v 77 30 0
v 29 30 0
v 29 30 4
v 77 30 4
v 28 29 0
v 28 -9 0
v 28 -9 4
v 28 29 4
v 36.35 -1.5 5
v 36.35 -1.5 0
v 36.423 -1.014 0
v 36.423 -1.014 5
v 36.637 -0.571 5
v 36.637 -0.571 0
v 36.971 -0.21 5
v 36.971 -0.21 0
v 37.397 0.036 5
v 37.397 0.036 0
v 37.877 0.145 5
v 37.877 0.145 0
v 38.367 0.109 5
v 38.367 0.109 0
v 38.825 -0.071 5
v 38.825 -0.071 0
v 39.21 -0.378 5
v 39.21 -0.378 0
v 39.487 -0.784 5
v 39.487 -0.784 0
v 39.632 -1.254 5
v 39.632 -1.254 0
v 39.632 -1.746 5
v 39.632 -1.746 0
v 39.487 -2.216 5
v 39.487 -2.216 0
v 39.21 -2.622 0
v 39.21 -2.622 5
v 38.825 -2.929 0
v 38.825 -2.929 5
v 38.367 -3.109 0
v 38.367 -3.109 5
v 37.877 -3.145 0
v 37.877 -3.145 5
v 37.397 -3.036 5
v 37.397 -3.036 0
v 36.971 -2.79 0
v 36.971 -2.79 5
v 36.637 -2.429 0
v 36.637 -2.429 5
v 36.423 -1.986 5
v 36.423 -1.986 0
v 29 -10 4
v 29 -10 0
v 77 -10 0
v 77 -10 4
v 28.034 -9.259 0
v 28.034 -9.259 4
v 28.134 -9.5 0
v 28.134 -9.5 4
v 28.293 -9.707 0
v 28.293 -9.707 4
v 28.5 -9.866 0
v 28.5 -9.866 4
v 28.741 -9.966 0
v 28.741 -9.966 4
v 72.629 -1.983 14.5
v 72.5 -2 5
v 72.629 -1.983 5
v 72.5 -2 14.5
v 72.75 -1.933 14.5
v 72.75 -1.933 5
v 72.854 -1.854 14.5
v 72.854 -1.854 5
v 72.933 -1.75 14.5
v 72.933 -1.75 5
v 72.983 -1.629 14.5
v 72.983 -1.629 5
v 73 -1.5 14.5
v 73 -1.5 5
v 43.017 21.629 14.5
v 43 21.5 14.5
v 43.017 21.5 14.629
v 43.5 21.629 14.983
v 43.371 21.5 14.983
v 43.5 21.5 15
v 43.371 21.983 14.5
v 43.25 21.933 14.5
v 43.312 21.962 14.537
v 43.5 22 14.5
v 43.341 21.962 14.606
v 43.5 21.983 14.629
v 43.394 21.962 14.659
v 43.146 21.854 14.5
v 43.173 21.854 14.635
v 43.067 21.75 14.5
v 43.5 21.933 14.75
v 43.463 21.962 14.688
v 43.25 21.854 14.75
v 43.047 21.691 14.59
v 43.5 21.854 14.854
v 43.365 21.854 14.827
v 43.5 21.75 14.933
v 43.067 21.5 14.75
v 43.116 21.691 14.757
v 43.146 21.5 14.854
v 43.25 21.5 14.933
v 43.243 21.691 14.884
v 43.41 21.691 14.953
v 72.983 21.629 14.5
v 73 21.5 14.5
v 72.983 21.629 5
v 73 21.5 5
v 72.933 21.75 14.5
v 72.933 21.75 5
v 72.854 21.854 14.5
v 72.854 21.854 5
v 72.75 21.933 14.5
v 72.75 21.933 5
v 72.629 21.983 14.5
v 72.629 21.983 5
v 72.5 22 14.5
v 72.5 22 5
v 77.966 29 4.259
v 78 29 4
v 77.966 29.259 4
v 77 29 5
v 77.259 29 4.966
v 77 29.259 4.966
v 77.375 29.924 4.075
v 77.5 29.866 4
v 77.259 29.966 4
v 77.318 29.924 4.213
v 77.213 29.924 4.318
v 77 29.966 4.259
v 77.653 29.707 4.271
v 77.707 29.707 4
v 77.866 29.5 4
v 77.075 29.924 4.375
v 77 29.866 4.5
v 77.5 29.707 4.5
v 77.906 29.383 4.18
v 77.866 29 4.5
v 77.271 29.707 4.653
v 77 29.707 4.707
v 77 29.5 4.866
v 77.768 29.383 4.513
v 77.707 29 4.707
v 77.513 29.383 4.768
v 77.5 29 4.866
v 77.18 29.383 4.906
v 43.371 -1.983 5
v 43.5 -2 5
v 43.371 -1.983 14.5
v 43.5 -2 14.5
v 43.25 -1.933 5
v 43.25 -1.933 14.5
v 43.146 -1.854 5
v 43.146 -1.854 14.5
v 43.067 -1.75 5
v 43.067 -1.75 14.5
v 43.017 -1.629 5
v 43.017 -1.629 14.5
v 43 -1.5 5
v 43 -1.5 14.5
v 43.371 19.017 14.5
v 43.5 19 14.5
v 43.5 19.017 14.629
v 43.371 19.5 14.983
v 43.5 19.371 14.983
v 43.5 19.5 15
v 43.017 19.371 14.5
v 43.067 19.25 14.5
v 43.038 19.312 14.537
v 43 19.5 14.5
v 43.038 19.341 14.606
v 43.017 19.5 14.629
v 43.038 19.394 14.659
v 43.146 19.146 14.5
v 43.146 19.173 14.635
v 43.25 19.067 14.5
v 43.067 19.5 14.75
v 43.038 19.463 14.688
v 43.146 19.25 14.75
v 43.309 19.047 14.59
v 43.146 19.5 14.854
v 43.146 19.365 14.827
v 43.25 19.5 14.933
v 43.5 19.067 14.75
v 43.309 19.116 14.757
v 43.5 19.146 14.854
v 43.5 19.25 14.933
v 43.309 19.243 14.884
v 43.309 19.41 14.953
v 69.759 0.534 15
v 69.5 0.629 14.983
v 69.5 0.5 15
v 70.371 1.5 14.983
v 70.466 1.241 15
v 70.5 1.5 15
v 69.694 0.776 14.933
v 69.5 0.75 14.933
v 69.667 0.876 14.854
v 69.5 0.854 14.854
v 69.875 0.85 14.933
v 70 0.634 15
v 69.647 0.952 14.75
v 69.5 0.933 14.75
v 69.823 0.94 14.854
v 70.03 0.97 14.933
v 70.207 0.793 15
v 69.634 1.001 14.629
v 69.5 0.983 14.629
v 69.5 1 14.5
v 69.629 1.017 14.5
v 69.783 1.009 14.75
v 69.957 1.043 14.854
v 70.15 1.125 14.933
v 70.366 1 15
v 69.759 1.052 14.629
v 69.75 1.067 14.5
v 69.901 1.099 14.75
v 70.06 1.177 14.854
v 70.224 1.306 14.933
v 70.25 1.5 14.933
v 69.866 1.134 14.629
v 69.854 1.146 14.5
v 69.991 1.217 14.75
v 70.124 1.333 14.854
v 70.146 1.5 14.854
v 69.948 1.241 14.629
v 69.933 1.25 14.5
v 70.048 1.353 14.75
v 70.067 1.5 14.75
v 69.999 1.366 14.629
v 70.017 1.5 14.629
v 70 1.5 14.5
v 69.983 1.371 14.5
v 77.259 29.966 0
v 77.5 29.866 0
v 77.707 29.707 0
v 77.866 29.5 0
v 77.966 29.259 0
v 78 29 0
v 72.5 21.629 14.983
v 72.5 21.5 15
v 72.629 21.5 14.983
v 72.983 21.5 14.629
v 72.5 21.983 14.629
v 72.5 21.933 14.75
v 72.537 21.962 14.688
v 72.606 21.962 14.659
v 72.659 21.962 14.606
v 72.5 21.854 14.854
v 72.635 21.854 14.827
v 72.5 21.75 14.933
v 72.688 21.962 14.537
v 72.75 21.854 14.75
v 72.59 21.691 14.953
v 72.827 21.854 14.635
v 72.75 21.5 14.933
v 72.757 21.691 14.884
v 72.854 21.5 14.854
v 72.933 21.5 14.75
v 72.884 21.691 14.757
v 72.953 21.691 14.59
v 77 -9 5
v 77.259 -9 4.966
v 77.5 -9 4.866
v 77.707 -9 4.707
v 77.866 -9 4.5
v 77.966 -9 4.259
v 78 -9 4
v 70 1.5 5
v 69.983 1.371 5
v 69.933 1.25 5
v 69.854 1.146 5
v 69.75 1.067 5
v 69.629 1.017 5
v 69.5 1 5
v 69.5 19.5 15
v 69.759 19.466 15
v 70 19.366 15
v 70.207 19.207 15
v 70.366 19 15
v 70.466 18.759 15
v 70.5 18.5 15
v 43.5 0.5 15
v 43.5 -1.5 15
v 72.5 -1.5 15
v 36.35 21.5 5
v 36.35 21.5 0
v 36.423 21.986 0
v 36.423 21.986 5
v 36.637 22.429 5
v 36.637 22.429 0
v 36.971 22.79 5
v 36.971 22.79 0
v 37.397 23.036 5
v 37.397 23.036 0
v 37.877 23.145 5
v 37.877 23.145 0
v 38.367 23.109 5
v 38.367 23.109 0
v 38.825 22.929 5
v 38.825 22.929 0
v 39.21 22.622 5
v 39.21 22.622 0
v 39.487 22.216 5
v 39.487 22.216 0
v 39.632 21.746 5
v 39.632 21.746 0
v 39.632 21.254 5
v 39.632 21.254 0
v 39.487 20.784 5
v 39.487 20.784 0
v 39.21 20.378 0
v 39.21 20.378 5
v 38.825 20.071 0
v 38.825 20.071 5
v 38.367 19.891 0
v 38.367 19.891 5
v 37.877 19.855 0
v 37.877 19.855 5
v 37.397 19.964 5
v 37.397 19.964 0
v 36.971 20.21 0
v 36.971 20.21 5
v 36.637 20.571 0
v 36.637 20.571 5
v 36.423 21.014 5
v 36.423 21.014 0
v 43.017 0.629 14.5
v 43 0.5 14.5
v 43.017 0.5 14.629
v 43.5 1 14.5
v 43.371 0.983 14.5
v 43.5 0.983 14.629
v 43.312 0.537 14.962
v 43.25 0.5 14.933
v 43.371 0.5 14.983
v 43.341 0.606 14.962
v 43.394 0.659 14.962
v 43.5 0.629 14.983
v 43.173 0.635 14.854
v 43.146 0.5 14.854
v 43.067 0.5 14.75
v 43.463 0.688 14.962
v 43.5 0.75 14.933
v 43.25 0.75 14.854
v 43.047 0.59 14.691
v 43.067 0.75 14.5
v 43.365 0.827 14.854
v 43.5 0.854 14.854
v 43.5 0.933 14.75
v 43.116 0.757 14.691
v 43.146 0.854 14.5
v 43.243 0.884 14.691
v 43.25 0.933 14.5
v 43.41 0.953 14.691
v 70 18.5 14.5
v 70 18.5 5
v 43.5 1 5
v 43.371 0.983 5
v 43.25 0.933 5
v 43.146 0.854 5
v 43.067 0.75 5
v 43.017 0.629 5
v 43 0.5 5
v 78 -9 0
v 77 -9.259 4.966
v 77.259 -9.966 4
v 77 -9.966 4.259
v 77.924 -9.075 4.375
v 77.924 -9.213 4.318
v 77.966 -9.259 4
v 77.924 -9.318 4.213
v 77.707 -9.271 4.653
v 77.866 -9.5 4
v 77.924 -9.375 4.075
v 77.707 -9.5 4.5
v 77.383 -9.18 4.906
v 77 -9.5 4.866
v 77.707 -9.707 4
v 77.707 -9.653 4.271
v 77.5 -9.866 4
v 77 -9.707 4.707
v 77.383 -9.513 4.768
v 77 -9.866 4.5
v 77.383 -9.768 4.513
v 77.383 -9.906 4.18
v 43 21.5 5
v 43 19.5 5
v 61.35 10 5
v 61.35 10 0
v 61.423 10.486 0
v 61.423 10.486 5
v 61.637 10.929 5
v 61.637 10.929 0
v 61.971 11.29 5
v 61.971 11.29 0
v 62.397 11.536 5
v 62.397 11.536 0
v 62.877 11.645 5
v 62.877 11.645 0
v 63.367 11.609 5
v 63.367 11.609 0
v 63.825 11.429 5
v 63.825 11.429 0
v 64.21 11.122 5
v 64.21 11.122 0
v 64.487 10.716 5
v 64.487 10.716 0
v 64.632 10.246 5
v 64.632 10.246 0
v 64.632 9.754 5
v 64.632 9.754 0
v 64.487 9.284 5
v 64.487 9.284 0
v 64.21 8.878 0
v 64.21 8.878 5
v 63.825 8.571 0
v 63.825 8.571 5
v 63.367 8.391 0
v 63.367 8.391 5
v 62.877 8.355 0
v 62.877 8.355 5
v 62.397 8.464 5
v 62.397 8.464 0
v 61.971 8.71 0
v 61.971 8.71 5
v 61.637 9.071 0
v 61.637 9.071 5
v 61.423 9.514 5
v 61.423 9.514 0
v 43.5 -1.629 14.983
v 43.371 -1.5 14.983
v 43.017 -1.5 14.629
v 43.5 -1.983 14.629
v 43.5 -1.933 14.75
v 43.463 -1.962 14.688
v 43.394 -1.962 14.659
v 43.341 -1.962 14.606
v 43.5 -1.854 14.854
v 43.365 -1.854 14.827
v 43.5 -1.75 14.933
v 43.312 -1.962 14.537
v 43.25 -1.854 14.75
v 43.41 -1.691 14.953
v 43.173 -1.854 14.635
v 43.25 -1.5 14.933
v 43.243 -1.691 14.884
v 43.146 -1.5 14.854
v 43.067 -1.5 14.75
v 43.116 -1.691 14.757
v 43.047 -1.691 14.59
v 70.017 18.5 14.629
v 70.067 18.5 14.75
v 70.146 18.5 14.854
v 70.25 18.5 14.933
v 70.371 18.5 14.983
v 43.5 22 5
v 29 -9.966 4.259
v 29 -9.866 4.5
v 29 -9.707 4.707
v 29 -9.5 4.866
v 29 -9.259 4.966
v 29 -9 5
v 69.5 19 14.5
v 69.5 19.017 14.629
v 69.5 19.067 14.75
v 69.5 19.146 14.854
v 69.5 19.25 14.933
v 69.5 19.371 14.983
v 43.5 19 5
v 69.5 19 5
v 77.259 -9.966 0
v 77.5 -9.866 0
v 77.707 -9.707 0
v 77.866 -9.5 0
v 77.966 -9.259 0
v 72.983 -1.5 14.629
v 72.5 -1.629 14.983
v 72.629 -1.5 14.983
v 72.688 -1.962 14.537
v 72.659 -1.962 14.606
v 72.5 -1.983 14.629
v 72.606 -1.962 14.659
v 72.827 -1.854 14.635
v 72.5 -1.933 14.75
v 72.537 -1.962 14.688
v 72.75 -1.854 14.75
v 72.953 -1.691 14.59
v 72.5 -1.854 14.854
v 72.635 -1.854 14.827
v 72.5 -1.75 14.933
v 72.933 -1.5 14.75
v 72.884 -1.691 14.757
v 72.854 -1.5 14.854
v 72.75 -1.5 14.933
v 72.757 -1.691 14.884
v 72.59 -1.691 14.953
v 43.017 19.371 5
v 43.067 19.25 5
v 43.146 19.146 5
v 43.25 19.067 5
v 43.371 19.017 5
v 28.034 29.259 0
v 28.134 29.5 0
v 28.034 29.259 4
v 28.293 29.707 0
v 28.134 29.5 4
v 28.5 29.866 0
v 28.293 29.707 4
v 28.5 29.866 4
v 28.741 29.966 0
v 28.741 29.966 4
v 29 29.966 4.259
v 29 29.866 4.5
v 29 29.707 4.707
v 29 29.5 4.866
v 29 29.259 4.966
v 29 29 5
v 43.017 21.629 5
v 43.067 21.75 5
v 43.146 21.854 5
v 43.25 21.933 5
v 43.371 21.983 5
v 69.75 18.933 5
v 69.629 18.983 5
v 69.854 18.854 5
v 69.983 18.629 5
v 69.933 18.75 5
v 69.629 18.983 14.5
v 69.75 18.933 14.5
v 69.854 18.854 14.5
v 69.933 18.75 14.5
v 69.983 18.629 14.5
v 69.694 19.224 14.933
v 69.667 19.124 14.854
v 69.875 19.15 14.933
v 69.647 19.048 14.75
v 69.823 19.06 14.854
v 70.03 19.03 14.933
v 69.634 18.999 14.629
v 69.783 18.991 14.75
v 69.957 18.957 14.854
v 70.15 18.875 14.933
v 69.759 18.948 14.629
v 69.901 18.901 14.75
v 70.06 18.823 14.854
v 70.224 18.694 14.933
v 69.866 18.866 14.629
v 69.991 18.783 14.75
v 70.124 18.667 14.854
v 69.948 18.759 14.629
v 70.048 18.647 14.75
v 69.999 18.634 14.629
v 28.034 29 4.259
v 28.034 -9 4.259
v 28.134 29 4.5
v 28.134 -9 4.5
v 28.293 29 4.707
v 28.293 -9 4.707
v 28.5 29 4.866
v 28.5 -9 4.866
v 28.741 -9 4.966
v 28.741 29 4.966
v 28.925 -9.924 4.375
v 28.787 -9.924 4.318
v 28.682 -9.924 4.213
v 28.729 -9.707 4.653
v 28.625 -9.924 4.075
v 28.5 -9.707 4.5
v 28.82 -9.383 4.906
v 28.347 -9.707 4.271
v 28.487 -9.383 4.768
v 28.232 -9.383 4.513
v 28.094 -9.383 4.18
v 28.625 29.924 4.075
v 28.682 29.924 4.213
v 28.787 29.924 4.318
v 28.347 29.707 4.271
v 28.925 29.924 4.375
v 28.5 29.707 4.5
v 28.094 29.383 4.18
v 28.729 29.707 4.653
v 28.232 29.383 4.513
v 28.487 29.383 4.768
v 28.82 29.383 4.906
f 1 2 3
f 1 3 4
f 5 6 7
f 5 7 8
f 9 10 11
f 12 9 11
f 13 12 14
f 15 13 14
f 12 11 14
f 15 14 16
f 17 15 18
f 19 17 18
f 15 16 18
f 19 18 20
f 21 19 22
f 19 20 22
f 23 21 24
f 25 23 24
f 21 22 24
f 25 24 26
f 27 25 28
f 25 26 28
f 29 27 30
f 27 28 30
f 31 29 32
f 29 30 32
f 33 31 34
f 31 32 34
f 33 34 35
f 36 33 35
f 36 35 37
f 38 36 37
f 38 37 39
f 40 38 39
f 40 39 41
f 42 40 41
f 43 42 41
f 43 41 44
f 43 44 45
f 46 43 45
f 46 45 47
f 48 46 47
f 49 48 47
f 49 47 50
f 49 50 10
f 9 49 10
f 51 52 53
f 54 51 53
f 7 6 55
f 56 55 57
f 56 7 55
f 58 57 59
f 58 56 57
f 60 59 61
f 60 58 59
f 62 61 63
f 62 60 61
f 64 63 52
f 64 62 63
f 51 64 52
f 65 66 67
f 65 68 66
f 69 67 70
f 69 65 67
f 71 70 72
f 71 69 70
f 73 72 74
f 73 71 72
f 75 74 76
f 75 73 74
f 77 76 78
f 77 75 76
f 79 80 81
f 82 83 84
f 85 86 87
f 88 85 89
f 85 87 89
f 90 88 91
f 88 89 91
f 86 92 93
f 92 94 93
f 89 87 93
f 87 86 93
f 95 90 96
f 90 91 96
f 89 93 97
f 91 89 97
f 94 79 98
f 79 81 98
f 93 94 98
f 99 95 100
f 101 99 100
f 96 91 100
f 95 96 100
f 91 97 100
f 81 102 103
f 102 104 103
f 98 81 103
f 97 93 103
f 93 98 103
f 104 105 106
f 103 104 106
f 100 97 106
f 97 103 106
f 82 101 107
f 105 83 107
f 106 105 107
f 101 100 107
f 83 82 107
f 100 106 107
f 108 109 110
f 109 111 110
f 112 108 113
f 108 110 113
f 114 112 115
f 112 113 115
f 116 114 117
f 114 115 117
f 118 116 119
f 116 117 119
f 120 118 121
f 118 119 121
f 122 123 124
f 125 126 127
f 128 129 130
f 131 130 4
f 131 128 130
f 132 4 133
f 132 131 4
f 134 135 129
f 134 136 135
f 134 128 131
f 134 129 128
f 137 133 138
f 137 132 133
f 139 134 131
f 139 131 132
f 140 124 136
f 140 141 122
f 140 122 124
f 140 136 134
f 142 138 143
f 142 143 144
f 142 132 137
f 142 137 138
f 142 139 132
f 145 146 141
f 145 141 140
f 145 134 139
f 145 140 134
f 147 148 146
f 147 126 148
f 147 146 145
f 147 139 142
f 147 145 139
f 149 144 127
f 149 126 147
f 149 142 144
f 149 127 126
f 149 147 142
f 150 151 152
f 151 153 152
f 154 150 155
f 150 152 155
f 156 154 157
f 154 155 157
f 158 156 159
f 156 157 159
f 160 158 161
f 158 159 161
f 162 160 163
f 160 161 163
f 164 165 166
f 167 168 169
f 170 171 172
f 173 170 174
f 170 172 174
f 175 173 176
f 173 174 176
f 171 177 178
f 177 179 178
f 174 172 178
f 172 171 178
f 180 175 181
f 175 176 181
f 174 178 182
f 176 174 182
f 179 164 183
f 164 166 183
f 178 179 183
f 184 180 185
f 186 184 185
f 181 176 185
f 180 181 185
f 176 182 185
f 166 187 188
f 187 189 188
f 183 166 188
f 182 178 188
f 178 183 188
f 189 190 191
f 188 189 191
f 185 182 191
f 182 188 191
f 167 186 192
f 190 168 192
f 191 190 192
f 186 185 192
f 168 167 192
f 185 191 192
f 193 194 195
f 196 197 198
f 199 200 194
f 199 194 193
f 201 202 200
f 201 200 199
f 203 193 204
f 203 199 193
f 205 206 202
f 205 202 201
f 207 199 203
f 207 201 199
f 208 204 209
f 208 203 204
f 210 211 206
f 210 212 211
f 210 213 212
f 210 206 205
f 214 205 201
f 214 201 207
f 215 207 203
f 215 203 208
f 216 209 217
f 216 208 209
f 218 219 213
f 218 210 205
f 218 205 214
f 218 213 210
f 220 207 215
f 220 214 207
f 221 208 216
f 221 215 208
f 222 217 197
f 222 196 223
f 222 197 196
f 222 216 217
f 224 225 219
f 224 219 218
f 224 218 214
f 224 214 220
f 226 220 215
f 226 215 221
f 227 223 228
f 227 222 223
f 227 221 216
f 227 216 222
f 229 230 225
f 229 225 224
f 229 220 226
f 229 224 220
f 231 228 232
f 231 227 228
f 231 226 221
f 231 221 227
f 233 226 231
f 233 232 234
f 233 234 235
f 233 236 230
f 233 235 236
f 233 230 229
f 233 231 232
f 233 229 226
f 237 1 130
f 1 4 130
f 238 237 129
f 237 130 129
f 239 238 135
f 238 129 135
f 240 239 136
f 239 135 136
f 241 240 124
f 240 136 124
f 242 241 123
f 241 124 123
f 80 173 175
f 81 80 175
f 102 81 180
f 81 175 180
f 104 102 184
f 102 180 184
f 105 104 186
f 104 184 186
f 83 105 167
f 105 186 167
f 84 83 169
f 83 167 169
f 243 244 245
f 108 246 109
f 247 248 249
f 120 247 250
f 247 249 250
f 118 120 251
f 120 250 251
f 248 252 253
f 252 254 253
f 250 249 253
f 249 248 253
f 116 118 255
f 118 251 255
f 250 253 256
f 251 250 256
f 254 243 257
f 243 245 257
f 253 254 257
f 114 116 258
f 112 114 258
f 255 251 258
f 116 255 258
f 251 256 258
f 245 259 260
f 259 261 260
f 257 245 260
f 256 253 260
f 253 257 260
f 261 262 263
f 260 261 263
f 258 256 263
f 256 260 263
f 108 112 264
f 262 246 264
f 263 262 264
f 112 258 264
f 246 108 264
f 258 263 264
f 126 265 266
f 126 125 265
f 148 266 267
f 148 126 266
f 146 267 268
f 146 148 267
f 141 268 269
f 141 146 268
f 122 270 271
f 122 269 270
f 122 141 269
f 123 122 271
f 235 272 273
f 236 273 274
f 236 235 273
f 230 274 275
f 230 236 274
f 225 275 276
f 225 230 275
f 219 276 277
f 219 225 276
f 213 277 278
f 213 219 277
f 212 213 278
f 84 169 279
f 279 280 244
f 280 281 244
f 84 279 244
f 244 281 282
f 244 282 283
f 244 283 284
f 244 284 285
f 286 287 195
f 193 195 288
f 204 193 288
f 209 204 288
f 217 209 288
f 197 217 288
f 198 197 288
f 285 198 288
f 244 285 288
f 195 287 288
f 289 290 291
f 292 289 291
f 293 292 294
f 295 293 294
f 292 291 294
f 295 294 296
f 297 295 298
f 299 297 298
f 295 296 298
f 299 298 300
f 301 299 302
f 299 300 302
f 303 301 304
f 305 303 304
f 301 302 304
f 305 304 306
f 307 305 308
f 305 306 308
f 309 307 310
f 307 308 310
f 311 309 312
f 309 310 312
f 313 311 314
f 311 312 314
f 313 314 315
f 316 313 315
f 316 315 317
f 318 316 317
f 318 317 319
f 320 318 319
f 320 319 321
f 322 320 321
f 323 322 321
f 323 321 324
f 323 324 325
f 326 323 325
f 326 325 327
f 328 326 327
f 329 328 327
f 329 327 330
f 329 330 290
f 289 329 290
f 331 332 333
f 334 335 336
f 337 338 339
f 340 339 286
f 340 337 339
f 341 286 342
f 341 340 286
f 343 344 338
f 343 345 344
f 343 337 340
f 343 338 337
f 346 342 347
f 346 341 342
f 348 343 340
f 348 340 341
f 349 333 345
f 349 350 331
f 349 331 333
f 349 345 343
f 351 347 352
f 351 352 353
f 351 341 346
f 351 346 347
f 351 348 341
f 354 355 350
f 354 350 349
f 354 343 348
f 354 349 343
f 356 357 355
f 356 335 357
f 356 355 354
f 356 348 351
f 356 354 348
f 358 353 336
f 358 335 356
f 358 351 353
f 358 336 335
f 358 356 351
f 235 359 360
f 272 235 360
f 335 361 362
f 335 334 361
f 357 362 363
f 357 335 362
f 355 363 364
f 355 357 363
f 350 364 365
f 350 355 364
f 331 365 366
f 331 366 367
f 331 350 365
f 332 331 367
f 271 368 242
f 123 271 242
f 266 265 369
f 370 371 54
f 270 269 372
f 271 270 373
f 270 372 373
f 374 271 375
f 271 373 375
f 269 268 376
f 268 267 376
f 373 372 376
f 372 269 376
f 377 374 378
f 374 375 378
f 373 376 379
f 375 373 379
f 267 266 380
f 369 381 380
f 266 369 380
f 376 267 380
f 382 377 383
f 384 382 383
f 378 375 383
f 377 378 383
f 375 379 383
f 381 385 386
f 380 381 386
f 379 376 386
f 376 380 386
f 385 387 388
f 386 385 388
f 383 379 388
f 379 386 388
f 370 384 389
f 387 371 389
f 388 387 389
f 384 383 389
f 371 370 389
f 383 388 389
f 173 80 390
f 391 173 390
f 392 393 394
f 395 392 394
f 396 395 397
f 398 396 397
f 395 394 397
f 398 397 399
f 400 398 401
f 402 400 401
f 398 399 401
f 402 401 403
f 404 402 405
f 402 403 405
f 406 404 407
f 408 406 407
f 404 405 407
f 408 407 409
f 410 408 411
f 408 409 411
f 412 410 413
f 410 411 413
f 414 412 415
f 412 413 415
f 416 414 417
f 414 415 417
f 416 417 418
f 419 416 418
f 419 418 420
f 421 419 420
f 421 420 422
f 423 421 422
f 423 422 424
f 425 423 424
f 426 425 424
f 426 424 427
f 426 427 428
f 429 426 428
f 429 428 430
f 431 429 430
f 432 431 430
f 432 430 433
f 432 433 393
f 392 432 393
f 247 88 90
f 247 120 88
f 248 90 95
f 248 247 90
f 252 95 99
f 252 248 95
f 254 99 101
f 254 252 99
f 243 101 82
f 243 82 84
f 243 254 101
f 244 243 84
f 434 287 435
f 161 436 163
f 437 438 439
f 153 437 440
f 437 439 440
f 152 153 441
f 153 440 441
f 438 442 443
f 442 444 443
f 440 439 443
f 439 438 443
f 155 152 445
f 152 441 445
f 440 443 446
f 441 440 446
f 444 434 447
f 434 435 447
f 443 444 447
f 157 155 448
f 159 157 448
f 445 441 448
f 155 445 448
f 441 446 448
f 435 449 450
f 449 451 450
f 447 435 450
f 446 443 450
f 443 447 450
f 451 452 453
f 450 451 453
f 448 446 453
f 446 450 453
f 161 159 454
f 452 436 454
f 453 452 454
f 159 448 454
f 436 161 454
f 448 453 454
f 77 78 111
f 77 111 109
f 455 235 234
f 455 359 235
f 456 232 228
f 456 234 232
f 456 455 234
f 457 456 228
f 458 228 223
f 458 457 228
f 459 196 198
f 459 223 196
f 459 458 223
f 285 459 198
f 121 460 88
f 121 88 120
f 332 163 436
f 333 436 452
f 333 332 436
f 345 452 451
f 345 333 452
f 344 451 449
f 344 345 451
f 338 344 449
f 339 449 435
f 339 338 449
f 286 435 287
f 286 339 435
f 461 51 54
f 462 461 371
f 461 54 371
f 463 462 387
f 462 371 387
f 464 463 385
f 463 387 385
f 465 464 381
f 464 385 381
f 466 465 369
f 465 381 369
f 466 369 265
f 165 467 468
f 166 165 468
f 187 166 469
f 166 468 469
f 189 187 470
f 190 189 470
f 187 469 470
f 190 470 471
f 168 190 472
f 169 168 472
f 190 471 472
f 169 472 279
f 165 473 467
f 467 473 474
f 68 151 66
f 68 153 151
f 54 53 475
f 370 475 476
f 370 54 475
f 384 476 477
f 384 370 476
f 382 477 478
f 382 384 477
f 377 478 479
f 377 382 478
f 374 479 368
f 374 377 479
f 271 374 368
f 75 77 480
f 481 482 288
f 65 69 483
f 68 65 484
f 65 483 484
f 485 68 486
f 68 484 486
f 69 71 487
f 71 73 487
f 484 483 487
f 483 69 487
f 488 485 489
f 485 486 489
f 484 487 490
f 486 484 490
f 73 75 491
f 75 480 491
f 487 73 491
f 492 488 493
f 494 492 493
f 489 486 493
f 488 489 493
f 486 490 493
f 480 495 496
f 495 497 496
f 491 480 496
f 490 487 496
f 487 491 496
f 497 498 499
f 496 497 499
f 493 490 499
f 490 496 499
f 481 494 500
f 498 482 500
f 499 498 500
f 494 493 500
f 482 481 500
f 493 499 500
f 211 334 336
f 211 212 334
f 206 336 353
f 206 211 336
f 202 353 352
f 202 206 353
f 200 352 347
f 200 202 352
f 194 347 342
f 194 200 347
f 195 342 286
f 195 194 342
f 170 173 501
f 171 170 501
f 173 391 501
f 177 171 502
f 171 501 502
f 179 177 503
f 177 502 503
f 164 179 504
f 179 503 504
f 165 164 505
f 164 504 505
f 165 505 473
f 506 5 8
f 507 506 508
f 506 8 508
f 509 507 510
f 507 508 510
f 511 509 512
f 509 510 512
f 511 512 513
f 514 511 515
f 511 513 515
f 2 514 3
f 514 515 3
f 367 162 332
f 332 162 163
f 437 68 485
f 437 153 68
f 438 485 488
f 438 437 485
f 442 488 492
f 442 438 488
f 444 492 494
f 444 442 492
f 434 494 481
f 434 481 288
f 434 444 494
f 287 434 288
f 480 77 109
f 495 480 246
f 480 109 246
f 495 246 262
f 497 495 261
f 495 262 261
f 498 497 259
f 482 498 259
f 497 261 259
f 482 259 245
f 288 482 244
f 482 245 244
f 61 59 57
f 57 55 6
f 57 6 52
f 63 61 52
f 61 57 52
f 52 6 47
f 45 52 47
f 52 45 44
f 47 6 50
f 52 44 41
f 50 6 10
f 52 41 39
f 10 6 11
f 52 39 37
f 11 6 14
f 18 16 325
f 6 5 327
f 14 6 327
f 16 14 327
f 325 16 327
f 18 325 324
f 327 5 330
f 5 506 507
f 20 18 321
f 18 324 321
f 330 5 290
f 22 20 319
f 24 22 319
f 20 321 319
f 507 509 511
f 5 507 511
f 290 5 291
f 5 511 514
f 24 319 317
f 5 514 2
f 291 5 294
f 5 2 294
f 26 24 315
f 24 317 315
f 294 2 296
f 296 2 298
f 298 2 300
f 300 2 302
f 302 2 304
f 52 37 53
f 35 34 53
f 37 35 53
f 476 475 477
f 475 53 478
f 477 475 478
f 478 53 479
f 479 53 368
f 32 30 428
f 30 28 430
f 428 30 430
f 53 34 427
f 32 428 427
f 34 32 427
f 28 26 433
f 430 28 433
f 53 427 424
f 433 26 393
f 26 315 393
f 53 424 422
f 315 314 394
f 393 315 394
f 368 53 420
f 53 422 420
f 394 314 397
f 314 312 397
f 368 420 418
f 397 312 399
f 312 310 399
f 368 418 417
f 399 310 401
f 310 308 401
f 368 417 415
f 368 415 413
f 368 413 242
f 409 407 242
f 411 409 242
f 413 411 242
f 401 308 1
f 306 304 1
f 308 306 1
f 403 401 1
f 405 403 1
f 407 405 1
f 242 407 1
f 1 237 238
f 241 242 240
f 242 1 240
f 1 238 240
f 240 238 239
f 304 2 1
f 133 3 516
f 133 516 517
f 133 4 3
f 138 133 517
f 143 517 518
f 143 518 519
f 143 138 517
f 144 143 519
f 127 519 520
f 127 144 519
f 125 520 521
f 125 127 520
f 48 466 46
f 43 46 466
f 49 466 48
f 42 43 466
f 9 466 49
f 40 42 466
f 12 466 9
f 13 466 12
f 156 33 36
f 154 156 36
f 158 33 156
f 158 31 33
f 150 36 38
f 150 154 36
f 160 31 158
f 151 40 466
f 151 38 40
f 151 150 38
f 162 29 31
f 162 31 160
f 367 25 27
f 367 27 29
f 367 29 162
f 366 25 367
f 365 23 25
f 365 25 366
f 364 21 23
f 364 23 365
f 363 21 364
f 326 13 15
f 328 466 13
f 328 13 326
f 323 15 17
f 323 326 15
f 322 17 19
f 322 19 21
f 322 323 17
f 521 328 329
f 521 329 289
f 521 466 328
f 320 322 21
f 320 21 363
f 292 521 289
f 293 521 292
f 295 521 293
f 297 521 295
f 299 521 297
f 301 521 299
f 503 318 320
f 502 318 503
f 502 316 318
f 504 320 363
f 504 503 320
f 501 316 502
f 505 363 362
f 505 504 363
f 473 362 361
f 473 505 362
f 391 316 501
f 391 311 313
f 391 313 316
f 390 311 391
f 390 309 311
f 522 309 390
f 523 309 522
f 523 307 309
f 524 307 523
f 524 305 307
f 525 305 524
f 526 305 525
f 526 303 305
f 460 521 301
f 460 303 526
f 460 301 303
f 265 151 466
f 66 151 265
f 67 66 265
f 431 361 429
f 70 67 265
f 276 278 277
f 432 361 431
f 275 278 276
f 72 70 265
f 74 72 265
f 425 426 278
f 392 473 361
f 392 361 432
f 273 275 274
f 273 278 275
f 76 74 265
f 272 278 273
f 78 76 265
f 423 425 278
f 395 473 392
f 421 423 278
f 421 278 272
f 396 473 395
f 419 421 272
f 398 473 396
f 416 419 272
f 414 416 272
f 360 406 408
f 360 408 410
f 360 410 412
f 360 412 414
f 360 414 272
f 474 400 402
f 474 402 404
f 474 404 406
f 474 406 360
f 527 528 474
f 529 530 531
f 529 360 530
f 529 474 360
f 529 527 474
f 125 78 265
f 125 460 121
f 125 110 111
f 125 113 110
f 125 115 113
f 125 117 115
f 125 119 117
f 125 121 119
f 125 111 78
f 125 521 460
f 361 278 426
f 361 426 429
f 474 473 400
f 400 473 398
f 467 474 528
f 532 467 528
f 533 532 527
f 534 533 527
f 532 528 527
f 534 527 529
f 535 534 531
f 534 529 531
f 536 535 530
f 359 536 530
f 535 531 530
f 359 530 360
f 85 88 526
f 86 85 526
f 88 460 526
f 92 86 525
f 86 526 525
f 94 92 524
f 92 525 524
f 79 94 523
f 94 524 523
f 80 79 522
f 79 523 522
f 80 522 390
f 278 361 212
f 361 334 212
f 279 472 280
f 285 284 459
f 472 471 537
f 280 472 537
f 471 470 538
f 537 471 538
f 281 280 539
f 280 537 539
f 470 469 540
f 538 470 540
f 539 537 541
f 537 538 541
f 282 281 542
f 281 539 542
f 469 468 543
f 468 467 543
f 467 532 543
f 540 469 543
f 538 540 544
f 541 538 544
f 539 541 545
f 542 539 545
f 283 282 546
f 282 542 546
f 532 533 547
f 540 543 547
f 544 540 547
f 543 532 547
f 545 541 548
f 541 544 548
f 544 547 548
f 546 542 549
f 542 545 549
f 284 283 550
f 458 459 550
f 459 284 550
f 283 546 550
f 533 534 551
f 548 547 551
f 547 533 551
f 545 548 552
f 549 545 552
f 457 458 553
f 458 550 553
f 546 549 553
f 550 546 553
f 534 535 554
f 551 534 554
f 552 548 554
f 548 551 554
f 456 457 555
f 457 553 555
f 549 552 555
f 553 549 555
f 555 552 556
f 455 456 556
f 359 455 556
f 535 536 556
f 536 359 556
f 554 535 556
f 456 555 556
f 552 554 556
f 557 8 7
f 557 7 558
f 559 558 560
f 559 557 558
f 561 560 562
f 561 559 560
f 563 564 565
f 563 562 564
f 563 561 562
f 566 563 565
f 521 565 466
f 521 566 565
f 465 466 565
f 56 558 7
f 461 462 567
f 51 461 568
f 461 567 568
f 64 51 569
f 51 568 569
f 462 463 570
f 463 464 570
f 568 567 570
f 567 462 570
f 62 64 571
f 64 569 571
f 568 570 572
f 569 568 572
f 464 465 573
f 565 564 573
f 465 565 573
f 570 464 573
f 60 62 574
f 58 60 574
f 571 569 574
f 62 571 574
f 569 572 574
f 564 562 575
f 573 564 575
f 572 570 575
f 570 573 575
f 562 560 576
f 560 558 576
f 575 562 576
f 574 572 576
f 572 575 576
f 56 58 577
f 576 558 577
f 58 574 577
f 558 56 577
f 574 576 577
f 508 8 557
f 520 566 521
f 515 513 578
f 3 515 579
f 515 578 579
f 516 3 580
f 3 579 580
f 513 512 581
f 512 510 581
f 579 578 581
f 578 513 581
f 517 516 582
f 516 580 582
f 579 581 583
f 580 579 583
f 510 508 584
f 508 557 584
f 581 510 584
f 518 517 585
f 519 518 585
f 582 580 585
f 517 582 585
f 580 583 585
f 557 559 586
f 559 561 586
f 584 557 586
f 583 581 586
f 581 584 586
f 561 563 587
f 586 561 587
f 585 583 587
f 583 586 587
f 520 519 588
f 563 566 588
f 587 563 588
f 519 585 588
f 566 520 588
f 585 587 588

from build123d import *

# Parameters (mm, degrees)
SKETCH_2_W          = 50
SKETCH_2_H          = 40
EXTRUDE_1_DEPTH     = 5
EXTRUDE_START       = -8
SKETCH_5_W          = 30
SKETCH_5_H          = 10
EXTRUDE_2_DEPTH     = 3
SKETCH_6_W          = 30
SKETCH_6_H          = 10
EXTRUDE_3_DEPTH     = 3
CUT_EXTRUDE_1_REACH = 86.906
SKETCH_7_R          = 1.65
FILLET_3_R          = 1
SKETCH_8_W          = 10
SKETCH_8_H          = 21
EXTRUDE_4_DEPTH     = 3
FILLET_4_R          = 0.5


with BuildPart() as part:
    # 草图2 → 凸台-拉伸1 (new body)
    with BuildSketch(Plane.XY):
        with Locations((53, 10)):
            Rectangle(SKETCH_2_W, SKETCH_2_H)
    extrude(amount=EXTRUDE_1_DEPTH)

    # 草图5 → 凸台-拉伸2 (add)
    with BuildSketch(Plane.XZ.offset(10).offset(EXTRUDE_START)):
        with Locations((58, 10)):
            Rectangle(SKETCH_5_W, SKETCH_5_H)
    extrude(amount=-EXTRUDE_2_DEPTH)

    # 草图6 → 凸台-拉伸3 (add)
    with BuildSketch(Plane(origin=(0, 30, 0), x_dir=(1, 0, 0), z_dir=(0, 1, 0)).offset(EXTRUDE_START)):
        with Locations((58, -10)):
            Rectangle(SKETCH_6_W, SKETCH_6_H)
    extrude(amount=-EXTRUDE_3_DEPTH)

    # 草图7 → 切除-拉伸1 (cut, up to next)
    with BuildSketch(Plane(origin=(0, 0, 0), x_dir=(-1, 0, 0), z_dir=(0, 0, -1)), mode=Mode.PRIVATE) as cut_extrude_1_sk1:
        with Locations((-63, 10)):
            Circle(SKETCH_7_R)
    cut_extrude_1_tool1 = extrude(cut_extrude_1_sk1.sketch, amount=-CUT_EXTRUDE_1_REACH, mode=Mode.PRIVATE) & part.part
    # 草图7 → 切除-拉伸1 (cut, up to next)
    with BuildSketch(Plane(origin=(0, 0, 0), x_dir=(-1, 0, 0), z_dir=(0, 0, -1)), mode=Mode.PRIVATE) as cut_extrude_1_sk2:
        with Locations((-38, -1.5)):
            Circle(SKETCH_7_R)
    cut_extrude_1_tool2 = extrude(cut_extrude_1_sk2.sketch, amount=-CUT_EXTRUDE_1_REACH, mode=Mode.PRIVATE) & part.part
    # 草图7 → 切除-拉伸1 (cut, up to next)
    with BuildSketch(Plane(origin=(0, 0, 0), x_dir=(-1, 0, 0), z_dir=(0, 0, -1)), mode=Mode.PRIVATE) as cut_extrude_1_sk3:
        with Locations((-38, 21.5)):
            Circle(SKETCH_7_R)
    cut_extrude_1_tool3 = extrude(cut_extrude_1_sk3.sketch, amount=-CUT_EXTRUDE_1_REACH, mode=Mode.PRIVATE) & part.part
    add(cut_extrude_1_tool1.solids().sort_by_distance((63, 10, 0))[0], mode=Mode.SUBTRACT)
    add(cut_extrude_1_tool2.solids().sort_by_distance((38, -1.5, 0))[0], mode=Mode.SUBTRACT)
    add(cut_extrude_1_tool3.solids().sort_by_distance((38, 21.5, 0))[0], mode=Mode.SUBTRACT)

    # 圆角3
    fillet_3_edges = [part.edges().sort_by_distance(p)[0] for p in [
        (28, 10, 5),
        (53, -10, 5),
        (78, 10, 5),
        (78, -10, 2.5),
        (28, -10, 2.5),
        (28, 30, 2.5),
        (78, 30, 2.5),
        (53, 30, 5),
    ]]
    fillet(fillet_3_edges, radius=FILLET_3_R)

    # 草图8 → 凸台-拉伸4 (add)
    with BuildSketch(Plane(origin=(73, 0, 0), x_dir=(0, 0, -1), z_dir=(1, 0, 0))):
        with Locations((-10, 8.5)):
            Rectangle(SKETCH_8_W, SKETCH_8_H)
    extrude(amount=-EXTRUDE_4_DEPTH)

    # 圆角4
    fillet_4_edges = [part.edges().sort_by_distance(p)[0] for p in [
        (43, 1, 10),
        (43, -0.5, 15),
        (73, 10, 15),
        (73, -2, 10),
        (58, -2, 15),
        (43, -2, 10),
        (56.5, 19, 15),
        (43, 19, 10),
        (43, 20.5, 15),
        (43, 22, 10),
        (58, 22, 15),
        (73, 22, 10),
        (56.5, 1, 15),
        (70, 10, 15),
        (70, 1, 10),
        (70, 19, 10),
    ]]
    fillet(fillet_4_edges, radius=FILLET_4_R)


solid = part.part
